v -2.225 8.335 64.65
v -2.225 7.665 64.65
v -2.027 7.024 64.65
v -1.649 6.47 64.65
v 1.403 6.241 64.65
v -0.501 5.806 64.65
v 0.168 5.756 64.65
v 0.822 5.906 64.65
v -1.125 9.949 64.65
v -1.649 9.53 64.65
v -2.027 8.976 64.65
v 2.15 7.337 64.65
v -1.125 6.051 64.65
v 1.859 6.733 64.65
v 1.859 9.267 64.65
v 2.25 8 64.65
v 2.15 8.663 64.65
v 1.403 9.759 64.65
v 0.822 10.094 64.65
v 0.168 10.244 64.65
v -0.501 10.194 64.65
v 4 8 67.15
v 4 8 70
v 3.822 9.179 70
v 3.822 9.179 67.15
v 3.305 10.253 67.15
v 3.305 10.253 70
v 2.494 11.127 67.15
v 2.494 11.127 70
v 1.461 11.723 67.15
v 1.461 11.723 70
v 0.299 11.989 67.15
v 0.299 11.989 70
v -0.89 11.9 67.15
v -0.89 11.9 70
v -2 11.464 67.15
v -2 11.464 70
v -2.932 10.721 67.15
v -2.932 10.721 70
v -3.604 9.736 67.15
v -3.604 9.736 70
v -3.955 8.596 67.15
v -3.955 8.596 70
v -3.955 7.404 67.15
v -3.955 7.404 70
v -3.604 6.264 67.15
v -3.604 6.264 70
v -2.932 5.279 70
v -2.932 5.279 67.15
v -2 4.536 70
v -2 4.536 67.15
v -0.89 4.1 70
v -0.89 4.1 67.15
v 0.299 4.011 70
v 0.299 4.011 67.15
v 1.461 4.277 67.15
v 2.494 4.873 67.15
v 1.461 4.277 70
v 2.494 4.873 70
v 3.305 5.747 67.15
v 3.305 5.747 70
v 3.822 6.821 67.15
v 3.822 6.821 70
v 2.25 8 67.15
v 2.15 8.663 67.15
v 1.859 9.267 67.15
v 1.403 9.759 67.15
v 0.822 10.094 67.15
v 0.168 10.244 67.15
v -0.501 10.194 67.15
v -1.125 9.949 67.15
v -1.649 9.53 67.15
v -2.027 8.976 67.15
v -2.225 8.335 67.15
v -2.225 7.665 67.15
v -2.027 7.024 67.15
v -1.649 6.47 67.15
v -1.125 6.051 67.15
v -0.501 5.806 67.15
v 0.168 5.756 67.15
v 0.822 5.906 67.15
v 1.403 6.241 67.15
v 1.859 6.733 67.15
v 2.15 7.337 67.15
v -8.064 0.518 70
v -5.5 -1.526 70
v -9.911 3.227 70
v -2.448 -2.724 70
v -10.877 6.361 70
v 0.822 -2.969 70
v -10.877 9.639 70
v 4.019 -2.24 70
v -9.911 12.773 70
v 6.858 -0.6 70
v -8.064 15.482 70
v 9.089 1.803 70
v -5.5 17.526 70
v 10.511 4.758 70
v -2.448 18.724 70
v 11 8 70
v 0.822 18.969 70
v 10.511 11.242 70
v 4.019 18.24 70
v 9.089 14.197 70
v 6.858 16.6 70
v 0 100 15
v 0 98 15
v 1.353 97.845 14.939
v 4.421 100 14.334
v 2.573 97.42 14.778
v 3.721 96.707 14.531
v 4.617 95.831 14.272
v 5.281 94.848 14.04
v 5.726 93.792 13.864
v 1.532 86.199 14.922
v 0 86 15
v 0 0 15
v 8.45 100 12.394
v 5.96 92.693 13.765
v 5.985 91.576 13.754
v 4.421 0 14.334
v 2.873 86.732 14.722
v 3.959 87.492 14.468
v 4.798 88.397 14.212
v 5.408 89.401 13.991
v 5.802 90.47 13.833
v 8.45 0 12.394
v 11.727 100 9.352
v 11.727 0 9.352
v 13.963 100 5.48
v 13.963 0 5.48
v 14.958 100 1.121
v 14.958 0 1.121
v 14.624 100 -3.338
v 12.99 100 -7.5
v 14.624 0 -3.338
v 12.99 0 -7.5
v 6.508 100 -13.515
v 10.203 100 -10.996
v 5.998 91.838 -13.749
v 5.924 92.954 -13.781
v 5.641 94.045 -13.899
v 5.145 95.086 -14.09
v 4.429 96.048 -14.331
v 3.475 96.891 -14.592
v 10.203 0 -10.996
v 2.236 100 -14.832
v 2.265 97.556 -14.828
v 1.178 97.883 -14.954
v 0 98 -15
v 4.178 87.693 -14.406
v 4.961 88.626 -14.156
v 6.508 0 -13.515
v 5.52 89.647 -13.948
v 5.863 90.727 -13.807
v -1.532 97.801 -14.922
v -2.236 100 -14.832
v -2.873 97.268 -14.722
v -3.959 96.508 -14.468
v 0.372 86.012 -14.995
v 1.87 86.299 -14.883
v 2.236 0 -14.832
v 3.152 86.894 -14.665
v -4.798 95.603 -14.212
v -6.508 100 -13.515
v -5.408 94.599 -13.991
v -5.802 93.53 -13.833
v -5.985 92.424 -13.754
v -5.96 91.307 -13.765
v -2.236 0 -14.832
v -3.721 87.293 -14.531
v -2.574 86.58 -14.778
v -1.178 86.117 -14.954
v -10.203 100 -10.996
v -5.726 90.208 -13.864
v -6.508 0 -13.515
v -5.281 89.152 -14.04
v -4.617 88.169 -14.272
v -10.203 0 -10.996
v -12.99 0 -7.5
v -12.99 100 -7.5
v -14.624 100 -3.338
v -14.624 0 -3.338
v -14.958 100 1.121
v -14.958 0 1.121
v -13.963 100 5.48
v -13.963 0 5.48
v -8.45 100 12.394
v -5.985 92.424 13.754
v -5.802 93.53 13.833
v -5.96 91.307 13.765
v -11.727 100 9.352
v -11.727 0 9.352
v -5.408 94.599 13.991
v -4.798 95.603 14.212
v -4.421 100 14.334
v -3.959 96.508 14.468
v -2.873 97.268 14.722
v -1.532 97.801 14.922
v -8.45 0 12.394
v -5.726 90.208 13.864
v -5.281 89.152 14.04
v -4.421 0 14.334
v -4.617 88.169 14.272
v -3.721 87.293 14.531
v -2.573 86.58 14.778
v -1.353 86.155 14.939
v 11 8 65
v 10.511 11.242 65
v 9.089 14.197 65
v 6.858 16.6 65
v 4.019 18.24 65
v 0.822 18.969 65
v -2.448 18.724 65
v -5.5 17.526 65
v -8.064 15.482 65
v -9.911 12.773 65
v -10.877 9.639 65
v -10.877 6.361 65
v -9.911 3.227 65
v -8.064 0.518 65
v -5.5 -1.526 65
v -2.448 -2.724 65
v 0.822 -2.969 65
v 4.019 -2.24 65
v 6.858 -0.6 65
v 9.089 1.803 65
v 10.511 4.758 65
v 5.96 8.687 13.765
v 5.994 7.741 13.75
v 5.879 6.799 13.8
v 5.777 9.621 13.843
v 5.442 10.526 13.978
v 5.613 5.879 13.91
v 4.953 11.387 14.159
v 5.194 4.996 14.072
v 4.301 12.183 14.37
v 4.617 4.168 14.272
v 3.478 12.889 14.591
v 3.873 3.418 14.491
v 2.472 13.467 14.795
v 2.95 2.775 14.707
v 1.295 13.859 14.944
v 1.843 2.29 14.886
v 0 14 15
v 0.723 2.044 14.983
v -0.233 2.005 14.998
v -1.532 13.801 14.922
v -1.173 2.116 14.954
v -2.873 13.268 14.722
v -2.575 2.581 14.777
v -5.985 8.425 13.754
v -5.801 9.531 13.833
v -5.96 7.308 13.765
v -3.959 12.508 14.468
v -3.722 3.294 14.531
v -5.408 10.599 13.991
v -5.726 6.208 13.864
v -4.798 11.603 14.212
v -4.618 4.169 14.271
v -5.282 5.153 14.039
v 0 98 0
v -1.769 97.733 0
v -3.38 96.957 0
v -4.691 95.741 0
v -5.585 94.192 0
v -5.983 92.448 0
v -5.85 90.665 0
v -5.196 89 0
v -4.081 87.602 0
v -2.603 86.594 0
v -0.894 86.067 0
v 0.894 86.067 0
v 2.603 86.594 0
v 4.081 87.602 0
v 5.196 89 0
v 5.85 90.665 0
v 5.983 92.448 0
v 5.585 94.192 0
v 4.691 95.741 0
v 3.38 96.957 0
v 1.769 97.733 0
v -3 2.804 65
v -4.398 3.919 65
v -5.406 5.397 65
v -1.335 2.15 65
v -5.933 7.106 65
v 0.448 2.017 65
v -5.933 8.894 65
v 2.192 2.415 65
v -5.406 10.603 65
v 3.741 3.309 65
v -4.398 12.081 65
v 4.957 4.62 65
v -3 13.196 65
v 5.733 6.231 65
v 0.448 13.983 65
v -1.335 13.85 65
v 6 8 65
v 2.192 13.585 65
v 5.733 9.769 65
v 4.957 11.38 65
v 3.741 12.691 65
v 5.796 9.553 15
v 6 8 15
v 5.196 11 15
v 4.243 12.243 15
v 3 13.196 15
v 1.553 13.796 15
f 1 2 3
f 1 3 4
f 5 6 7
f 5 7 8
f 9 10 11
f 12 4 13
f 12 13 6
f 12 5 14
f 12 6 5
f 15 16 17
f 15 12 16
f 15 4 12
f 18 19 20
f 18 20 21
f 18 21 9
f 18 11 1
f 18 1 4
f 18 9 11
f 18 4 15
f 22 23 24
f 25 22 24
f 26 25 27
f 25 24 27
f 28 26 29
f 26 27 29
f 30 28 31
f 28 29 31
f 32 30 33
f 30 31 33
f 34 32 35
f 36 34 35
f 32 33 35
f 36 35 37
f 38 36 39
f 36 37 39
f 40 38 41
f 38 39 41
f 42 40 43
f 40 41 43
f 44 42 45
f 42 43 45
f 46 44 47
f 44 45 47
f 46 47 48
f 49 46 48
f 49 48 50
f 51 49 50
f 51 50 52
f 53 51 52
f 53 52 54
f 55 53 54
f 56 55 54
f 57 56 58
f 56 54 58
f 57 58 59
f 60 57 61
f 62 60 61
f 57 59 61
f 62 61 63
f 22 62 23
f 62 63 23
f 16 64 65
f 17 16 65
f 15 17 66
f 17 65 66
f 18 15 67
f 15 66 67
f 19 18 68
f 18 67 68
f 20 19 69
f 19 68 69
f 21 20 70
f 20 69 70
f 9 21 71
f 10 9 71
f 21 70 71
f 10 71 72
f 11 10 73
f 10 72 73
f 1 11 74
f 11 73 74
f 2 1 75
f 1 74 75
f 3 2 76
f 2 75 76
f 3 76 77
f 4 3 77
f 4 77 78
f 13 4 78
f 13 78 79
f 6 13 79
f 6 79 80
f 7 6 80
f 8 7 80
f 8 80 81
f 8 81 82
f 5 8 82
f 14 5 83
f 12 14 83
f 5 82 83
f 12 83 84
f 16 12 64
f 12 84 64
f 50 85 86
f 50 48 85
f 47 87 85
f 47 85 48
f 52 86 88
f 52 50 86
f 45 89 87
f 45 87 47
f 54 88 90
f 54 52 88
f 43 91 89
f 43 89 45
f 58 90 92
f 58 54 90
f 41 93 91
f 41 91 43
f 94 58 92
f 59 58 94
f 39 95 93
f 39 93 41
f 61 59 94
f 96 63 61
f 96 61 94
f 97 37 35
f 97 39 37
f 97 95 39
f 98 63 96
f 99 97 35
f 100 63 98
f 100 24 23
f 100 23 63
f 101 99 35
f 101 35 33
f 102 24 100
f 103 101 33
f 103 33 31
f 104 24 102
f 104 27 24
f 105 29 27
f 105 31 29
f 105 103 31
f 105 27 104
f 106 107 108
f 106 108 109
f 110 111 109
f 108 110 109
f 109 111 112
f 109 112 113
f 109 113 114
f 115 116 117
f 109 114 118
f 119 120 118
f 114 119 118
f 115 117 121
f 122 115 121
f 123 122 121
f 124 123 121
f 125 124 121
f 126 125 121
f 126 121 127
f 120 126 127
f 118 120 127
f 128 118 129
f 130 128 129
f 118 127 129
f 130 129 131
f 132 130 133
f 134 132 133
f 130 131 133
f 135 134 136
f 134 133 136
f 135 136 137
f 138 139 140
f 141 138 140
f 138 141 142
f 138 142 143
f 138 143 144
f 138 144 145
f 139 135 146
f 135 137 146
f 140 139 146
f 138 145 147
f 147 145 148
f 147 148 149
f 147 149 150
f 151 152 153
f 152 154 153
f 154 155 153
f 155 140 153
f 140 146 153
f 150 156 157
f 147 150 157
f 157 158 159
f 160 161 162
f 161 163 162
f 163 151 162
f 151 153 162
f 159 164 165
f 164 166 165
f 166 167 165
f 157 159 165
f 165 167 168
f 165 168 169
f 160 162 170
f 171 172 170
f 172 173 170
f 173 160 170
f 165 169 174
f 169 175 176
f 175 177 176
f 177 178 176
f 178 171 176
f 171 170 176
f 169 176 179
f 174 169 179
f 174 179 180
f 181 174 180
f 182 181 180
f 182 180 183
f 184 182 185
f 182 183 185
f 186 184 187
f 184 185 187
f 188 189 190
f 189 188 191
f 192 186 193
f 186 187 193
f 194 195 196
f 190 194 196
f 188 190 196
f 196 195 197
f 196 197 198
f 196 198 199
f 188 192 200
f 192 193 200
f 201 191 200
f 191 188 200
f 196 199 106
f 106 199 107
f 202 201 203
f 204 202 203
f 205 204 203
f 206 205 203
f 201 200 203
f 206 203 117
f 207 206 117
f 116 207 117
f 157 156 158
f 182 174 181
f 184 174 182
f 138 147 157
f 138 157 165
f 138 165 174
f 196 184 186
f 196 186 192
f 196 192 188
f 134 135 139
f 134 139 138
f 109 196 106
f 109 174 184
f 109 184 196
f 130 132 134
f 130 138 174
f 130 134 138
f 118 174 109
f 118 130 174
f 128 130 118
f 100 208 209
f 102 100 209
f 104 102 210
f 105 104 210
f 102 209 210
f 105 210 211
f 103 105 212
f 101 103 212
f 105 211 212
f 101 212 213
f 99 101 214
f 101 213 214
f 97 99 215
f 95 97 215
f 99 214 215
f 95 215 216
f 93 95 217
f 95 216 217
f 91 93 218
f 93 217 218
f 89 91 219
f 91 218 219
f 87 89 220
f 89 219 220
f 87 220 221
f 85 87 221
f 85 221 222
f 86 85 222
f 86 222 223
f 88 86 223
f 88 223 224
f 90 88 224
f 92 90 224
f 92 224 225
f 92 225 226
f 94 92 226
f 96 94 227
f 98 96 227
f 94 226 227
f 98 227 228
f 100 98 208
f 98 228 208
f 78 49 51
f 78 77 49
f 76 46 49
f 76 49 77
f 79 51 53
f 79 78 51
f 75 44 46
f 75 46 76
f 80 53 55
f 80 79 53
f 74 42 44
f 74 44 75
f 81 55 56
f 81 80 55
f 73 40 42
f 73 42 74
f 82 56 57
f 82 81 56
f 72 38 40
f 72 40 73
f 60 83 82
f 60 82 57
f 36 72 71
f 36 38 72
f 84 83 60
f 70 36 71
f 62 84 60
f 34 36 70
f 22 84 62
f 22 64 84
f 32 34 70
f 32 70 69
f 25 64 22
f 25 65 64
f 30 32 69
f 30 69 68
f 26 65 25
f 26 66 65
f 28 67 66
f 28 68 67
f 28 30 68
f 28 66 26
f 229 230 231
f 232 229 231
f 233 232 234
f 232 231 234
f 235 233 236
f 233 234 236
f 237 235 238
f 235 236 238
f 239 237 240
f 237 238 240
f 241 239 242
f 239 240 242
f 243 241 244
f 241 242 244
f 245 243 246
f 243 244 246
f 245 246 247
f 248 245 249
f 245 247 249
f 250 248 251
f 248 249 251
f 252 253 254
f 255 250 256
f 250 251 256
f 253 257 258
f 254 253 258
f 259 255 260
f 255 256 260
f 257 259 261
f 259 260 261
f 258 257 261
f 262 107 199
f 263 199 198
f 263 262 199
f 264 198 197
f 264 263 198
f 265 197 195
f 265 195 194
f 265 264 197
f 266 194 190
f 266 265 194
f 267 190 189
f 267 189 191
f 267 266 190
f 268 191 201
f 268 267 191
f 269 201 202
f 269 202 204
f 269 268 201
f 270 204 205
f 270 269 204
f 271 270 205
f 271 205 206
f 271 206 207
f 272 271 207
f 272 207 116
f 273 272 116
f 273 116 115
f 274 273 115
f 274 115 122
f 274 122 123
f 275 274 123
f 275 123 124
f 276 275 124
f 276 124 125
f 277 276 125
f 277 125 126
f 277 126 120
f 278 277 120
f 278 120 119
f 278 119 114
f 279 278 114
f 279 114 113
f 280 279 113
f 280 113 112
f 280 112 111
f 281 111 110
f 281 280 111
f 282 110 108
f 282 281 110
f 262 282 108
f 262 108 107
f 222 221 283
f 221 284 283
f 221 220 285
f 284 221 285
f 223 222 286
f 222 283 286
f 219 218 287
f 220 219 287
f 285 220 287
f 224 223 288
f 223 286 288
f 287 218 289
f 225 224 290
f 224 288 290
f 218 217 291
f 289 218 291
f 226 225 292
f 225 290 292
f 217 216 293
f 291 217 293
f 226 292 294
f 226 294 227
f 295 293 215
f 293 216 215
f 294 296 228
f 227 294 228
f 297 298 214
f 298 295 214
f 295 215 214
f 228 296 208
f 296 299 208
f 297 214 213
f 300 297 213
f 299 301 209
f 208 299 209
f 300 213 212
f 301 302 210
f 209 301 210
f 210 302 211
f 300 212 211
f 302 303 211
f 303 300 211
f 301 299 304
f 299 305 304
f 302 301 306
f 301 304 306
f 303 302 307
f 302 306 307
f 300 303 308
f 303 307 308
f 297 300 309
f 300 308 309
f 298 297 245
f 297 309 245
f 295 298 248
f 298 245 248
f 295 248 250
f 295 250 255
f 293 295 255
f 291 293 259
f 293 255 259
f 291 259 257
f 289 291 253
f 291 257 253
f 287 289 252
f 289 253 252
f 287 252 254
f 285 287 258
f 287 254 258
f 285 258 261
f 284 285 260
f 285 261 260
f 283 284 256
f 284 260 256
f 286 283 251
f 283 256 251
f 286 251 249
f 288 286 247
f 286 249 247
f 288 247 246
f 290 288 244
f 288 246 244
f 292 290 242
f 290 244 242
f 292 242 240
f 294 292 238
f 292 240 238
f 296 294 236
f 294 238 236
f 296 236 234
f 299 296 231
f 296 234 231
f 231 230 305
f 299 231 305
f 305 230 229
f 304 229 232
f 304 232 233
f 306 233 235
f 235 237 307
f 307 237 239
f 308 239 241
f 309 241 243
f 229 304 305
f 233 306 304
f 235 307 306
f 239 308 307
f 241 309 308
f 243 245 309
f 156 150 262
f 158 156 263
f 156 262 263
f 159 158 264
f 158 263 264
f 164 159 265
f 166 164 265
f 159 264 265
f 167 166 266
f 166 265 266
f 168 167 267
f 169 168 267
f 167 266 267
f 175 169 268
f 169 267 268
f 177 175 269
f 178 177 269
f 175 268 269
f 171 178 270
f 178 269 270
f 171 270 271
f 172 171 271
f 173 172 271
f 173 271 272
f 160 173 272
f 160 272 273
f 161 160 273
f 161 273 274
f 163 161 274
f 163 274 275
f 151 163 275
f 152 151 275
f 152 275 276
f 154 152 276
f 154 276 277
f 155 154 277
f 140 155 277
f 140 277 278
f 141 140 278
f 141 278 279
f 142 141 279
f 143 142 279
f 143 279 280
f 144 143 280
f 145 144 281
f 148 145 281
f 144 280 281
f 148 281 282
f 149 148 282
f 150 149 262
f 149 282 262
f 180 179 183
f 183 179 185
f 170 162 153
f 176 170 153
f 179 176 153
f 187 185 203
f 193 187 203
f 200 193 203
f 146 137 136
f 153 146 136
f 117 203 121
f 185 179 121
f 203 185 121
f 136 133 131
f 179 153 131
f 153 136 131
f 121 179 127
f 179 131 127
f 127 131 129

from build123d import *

# Parameters (mm, degrees)
SKETCH1_R                            = 15
BOSS_EXTRUDE1_DEPTH                  = 100
SKETCH2_R                            = 6
BOSS_EXTRUDE2_DEPTH                  = 50
BOSS_EXTRUDE2_DIRECTION_2_REACH      = 107.475
BOSS_EXTRUDE2_DIRECTION_2_END_RADIUS = 15
SKETCH3_R                            = 6
CUT_EXTRUDE1_DEPTH                   = 121.208152856
CUT_EXTRUDE1_DEPTH_BACK              = 121.208152856
SKETCH4_R                            = 11
BOSS_EXTRUDE3_DEPTH                  = 5
SKETCH5_R                            = 4
CUT_EXTRUDE2_DEPTH                   = 2.85
SKETCH6_R                            = 2.25
CUT_EXTRUDE3_DEPTH                   = 2.5


with BuildPart() as part:
    # Sketch1 → Boss-Extrude1 (new body)
    with BuildSketch(Plane(origin=(0, 0, 0), x_dir=(1, 0, 0), z_dir=(0, 1, 0))):
        with Locations(Location((0, 0, 0), (0, 0, 270))):
            Circle(SKETCH1_R)
    extrude(amount=BOSS_EXTRUDE1_DEPTH)

    # Sketch3 → Cut-Extrude1 (cut, two sides)
    with BuildSketch(Plane.XY) as cut_extrude1_sk:
        with Locations(Location((0, 92, 0), (0, 0, 90.000000001))):
            Circle(SKETCH3_R)
    extrude(amount=CUT_EXTRUDE1_DEPTH, mode=Mode.SUBTRACT)
    extrude(cut_extrude1_sk.sketch, amount=-CUT_EXTRUDE1_DEPTH_BACK, mode=Mode.SUBTRACT)


with BuildPart() as body_2:
    # Sketch2 → Boss-Extrude2 (new body)
    with BuildSketch(Plane.XY.offset(15)):
        with Locations((0, 8)):
            Circle(SKETCH2_R)
    extrude(amount=BOSS_EXTRUDE2_DEPTH)

    # Boss-Extrude2 direction 2: up to this cylinder (the profile starts outside it)
    boss_extrude2_direction_2_end = Plane(origin=(0, 8, 0), z_dir=(0, -1, 0)) * Cylinder(BOSS_EXTRUDE2_DIRECTION_2_END_RADIUS, 245.95, mode=Mode.PRIVATE)
    # Sketch2 → Boss-Extrude2 direction 2 (add, up to the surface)
    with BuildSketch(Plane.XY.offset(15), mode=Mode.PRIVATE) as boss_extrude2_direction_2_sk1:
        with Locations((0, 8)):
            Circle(SKETCH2_R)
    boss_extrude2_direction_2_tool1 = extrude(boss_extrude2_direction_2_sk1.sketch, amount=-BOSS_EXTRUDE2_DIRECTION_2_REACH, mode=Mode.PRIVATE) - boss_extrude2_direction_2_end
    add(boss_extrude2_direction_2_tool1.solids().sort_by_distance((0, 8, 15))[0])
    add(boss_extrude2_direction_2_tool1.solids().sort_by_distance((0, 8, 15))[1])

    # Sketch4 → Boss-Extrude3 (add)
    with BuildSketch(Plane.XY.offset(65)):
        with Locations((0, 8)):
            Circle(SKETCH4_R)
    extrude(amount=BOSS_EXTRUDE3_DEPTH)

    # Sketch5 → Cut-Extrude2 (cut)
    with BuildSketch(Plane.XY.offset(70)):
        with Locations((0, 8)):
            Circle(SKETCH5_R)
    extrude(amount=-CUT_EXTRUDE2_DEPTH, mode=Mode.SUBTRACT)

    # Sketch6 → Cut-Extrude3 (cut)
    with BuildSketch(Plane.XY.offset(67.15)):
        with Locations((0, 8)):
            Circle(SKETCH6_R)
    extrude(amount=-CUT_EXTRUDE3_DEPTH, mode=Mode.SUBTRACT)


solid = Compound([part.part, body_2.part])
